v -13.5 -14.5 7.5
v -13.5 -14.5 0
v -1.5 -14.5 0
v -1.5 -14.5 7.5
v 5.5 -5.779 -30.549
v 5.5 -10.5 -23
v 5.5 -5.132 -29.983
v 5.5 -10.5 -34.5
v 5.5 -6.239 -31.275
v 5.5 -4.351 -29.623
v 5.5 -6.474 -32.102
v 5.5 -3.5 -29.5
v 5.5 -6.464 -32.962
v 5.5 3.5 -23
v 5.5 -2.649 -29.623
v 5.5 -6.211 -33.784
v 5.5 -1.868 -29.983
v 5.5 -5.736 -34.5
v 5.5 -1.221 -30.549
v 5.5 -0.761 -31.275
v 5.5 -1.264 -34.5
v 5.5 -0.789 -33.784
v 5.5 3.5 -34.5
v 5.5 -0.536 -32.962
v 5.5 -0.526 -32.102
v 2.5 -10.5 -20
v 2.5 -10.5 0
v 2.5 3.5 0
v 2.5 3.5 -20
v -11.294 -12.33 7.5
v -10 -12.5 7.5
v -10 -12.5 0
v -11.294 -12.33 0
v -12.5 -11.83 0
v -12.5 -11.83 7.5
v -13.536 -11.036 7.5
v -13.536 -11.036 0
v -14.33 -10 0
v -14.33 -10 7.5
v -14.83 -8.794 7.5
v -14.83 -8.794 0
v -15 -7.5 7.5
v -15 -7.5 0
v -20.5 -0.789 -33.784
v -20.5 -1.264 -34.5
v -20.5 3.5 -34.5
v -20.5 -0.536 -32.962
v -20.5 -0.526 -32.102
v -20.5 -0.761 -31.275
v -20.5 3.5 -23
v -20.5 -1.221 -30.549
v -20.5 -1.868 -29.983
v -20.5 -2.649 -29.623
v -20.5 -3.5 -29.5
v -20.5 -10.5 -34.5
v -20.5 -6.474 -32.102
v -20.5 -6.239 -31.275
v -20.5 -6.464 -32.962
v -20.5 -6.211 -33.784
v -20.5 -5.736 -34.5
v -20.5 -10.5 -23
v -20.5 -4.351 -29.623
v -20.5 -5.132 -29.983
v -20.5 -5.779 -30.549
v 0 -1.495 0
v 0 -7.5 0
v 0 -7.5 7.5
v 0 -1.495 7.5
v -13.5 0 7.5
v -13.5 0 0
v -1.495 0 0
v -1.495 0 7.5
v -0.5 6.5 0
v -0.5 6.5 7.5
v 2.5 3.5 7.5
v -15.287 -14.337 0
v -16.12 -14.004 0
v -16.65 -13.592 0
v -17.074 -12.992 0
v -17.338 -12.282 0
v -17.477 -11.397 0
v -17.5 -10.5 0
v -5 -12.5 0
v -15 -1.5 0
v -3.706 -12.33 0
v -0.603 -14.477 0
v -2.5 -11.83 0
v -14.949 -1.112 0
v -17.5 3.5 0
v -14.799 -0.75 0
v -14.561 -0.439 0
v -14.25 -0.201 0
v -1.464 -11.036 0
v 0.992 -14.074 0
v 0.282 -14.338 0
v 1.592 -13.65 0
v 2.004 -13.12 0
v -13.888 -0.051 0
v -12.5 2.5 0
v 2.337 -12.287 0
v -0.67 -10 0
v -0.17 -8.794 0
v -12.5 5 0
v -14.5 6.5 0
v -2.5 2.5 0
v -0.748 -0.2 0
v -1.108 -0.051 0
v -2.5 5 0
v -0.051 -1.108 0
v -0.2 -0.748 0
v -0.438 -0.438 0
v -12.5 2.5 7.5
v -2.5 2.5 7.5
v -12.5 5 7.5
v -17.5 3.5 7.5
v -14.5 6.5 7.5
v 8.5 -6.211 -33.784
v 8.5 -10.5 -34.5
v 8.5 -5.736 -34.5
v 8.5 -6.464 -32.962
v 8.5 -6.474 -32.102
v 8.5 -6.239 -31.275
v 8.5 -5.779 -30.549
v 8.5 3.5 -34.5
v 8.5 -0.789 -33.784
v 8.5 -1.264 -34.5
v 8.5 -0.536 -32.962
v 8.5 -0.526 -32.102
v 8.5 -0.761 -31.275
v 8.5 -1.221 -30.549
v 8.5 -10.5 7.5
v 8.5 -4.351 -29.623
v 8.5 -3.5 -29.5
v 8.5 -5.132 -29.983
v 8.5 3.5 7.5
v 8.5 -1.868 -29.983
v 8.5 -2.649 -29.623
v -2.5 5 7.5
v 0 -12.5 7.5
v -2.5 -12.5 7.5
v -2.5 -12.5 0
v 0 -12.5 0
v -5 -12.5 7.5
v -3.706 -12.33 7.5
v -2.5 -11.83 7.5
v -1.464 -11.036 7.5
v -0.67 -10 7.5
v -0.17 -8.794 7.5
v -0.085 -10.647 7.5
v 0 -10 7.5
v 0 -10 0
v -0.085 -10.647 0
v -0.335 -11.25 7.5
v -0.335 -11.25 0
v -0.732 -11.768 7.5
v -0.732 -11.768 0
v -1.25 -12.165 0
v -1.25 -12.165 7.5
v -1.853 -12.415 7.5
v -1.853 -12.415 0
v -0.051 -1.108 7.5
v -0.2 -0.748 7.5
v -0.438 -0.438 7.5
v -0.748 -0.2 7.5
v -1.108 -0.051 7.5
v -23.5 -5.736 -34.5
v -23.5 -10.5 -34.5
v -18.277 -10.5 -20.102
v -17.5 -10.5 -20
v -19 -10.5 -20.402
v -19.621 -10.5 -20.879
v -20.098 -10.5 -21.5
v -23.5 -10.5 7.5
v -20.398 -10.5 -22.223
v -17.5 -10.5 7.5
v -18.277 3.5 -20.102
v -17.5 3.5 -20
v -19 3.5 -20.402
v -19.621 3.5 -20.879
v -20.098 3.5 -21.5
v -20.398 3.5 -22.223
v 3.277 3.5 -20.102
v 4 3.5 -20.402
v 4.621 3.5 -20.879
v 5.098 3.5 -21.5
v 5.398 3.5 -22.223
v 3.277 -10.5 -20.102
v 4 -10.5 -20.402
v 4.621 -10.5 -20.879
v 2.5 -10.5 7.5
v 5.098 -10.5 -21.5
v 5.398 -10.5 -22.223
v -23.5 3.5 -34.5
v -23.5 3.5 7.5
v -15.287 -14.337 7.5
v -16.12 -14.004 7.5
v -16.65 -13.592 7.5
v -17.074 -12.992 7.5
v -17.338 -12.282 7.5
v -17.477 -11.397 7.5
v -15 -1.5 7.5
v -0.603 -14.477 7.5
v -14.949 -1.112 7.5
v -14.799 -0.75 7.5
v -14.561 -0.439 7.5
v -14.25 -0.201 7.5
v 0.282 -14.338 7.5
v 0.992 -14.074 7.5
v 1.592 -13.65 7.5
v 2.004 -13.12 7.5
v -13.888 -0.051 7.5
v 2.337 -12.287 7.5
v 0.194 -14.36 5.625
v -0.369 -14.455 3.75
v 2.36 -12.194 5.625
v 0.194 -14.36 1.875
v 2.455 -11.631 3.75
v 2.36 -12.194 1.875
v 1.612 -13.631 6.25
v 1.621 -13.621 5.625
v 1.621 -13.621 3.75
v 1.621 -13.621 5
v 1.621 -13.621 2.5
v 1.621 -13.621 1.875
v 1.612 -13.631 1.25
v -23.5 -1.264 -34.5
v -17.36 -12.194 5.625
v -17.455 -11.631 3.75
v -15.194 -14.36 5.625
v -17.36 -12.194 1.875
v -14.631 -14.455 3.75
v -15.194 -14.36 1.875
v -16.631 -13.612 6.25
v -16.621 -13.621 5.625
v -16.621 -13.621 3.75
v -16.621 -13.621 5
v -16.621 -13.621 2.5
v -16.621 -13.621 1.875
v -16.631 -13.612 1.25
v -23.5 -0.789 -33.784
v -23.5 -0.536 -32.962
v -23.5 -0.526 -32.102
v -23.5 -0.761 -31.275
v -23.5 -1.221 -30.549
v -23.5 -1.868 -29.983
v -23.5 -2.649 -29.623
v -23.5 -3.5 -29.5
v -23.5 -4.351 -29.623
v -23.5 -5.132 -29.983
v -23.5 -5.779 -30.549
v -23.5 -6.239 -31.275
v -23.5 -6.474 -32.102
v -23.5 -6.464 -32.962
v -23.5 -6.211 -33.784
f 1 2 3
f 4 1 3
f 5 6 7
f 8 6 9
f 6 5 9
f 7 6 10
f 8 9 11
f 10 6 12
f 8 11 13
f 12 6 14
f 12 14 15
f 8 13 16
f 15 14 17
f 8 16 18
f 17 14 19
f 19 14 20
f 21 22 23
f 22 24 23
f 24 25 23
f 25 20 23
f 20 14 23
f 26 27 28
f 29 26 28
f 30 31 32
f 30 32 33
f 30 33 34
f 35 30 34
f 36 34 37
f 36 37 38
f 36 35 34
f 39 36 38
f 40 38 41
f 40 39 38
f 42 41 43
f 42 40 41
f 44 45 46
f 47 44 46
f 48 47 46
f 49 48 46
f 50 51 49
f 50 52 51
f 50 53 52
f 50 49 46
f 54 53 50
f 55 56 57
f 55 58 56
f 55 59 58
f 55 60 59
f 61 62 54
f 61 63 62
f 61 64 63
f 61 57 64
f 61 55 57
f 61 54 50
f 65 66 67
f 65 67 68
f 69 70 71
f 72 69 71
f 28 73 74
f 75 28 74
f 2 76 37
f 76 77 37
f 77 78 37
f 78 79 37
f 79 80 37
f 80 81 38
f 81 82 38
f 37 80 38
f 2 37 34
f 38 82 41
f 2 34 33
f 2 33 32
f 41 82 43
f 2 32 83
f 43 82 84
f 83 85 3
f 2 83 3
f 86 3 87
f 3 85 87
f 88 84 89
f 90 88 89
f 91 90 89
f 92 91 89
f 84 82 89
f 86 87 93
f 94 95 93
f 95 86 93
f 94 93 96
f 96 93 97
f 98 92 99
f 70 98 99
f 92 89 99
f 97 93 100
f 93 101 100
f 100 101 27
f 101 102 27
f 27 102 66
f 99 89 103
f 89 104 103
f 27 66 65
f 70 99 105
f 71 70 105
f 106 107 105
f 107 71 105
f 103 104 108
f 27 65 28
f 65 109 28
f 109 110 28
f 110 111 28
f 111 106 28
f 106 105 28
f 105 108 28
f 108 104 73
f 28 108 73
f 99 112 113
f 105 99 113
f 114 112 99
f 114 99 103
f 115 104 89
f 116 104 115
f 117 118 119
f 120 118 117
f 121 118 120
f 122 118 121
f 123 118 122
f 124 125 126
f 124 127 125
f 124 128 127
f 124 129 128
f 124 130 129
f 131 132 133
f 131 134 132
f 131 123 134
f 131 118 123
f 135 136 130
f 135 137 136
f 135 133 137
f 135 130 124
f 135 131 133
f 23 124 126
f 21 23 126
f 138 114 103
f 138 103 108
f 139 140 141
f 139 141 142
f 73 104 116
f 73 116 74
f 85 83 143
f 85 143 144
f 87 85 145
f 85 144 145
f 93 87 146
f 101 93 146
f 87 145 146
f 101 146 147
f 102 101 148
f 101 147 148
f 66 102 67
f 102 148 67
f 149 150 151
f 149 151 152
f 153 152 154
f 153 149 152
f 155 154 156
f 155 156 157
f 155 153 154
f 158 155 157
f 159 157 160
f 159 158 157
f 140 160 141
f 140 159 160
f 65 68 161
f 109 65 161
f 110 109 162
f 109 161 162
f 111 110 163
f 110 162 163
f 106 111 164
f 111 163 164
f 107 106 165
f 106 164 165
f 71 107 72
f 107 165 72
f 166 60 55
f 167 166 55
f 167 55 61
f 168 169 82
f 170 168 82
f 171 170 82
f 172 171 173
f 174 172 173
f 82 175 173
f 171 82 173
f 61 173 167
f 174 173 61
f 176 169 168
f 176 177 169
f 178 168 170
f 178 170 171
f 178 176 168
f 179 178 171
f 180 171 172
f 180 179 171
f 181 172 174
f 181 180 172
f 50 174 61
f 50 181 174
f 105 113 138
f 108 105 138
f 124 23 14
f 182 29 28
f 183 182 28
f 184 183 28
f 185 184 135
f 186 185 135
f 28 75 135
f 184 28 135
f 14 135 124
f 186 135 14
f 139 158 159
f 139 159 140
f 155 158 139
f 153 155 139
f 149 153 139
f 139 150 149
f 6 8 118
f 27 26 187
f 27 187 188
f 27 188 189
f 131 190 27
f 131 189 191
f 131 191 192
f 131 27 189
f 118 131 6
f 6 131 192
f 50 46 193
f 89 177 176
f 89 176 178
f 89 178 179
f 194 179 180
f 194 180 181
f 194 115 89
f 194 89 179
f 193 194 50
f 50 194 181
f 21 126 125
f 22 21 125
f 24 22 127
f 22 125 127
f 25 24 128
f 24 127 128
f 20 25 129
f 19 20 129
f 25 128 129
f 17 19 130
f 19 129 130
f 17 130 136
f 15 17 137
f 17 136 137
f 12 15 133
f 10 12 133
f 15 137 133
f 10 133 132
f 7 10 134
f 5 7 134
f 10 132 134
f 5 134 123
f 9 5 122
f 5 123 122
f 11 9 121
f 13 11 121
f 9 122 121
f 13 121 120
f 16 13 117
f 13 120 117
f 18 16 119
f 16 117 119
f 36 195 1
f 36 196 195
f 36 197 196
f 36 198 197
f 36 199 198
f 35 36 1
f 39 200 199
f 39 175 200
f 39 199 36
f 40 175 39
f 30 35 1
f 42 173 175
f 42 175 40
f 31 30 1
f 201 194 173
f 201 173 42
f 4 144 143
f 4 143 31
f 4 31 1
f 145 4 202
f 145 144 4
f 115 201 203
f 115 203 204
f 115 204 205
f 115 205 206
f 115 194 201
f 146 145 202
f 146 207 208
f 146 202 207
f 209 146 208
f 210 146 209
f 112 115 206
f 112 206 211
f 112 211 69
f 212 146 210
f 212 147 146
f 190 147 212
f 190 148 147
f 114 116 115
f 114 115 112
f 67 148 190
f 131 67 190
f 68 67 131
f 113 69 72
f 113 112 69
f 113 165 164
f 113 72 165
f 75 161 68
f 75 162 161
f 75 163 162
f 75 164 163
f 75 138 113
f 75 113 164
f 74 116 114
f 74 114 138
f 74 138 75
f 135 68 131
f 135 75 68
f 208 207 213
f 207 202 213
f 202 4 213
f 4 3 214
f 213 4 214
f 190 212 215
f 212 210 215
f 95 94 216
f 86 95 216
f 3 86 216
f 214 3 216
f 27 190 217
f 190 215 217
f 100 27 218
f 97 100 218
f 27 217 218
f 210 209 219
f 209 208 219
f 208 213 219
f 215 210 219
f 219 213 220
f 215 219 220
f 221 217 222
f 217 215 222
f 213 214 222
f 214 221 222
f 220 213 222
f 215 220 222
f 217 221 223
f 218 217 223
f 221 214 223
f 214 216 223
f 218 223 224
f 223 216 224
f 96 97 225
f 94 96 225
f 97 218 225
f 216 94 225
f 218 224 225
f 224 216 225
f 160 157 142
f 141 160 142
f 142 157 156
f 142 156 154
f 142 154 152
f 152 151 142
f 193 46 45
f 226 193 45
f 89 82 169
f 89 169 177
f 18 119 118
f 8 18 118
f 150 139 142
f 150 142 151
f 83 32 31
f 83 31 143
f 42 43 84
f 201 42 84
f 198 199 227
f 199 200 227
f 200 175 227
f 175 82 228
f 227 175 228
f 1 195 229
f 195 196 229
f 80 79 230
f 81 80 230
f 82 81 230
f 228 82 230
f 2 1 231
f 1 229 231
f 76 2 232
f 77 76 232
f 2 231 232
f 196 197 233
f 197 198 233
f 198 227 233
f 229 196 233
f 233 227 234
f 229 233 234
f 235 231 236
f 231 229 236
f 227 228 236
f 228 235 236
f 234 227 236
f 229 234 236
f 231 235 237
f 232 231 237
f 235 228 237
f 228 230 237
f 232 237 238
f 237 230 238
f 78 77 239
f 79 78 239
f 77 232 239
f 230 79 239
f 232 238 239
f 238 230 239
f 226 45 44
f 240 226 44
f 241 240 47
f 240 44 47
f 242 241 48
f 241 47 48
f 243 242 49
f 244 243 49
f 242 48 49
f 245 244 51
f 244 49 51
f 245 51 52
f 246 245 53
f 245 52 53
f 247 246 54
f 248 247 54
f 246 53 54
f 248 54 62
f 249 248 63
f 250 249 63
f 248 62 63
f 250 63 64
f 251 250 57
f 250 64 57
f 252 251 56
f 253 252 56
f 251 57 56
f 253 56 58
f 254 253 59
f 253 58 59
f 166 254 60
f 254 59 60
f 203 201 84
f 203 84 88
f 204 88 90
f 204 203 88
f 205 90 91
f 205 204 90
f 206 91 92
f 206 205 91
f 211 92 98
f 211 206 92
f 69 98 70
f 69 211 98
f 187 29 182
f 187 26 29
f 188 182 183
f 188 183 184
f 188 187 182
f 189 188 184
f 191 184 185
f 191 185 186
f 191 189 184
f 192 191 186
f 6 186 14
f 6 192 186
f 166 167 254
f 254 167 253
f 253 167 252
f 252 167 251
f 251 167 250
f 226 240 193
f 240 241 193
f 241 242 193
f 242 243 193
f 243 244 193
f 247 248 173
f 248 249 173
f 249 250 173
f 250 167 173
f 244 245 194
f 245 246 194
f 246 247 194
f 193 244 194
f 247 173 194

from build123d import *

# Parameters (mm, degrees)
SKETCH1_W               = 20
SKETCH1_H               = 21
SKETCH1_W_2             = 15
SKETCH1_H_2             = 12.5
BOSS_EXTRUDE1_DEPTH     = 7.5
FILLET1_SIZE            = 4
BOSS_EXTRUDE2_DEPTH     = 7.5
BOSS_EXTRUDE3_DEPTH     = 7.5
BOSS_EXTRUDE4_DEPTH     = 7.5
BOSS_EXTRUDE5_DEPTH     = 7.5
CHAMFER1_SIZE           = 3
SKETCH8_W               = 10
SKETCH8_H               = 2.5
CUT_EXTRUDE1_DEPTH      = 7.5
BOSS_EXTRUDE10_START    = -7.5
SKETCH19_W              = 6
SKETCH19_H              = 14
BOSS_EXTRUDE10_DEPTH    = 52.5
CUT_EXTRUDE5_DEPTH      = 54.863252857
CUT_EXTRUDE5_DEPTH_BACK = 15
FILLET2_R               = 3
CUT_EXTRUDE16_DEPTH     = 3
FILLET3_R               = 3
CUT_EXTRUDE17_DEPTH     = 35


# Some blends are built 0.0001 mm under size
with BuildPart() as part:
    # Sketch1 → Boss-Extrude1 (new body)
    with BuildSketch(Plane.XY):
        with Locations((-7.5, -4)):
            Rectangle(SKETCH1_W, SKETCH1_H)
        with Locations((-7.5, -6.25)):
            Rectangle(SKETCH1_W_2, SKETCH1_H_2, mode=Mode.SUBTRACT)
    extrude(amount=BOSS_EXTRUDE1_DEPTH)

    # Fillet1
    # a fillet whose section is not a circle: 4 mm, written as the material it takes off along each edge
    with BuildSketch(Plane(origin=(-17.5, -14.5, -10), x_dir=(0, 1, 0), z_dir=(0, 0, 1)), Plane(origin=(2.5, -14.5, -10), x_dir=(-1, 0, 0), z_dir=(0, 0, 1))) as fillet1_piece_1:
        with BuildLine():
            add(Edge.make_bspline([(FILLET1_SIZE, 0), (FILLET1_SIZE * 0.831801948466, 0), (FILLET1_SIZE * 0.663603896932, 0), (FILLET1_SIZE * 0.292893218813, -FILLET1_SIZE * 0.0716919198361), (FILLET1_SIZE * 0.0716919198361, -FILLET1_SIZE * 0.292893218813), (0, -FILLET1_SIZE * 0.663603896932), (0, -FILLET1_SIZE * 0.831801948466), (0, -FILLET1_SIZE)], knots=[0, 0, 0, 0, 0, 0, 0.5, 0.5, 1, 1, 1, 1, 1, 1], degree=5))
            Line((0, -FILLET1_SIZE), (0, 0))
            Line((0, 0), (FILLET1_SIZE, 0))
        make_face()
    extrude(amount=27.5, mode=Mode.SUBTRACT)

    # Sketch3 → Boss-Extrude2 (add)
    with BuildSketch(Plane.XY.offset(7.5)):
        with BuildLine():
            Line((-13.5, 0), (-15, 0))
            Line((-15, 0), (-15, -1.5))
            ThreePointArc((-15, -1.5), (-14.560660172, -0.439339828), (-13.5, 0))
        make_face()
    extrude(amount=-BOSS_EXTRUDE2_DEPTH)

    # Sketch4 → Boss-Extrude3 (add)
    with BuildSketch(Plane.XY.offset(7.5)):
        with BuildLine():
            Line((0, 0), (0, -1.495394009))
            ThreePointArc((0, -1.495394009), (-0.437990765, -0.437990765), (-1.495394009, 0))
            Line((-1.495394009, 0), (0, 0))
        make_face()
    extrude(amount=-BOSS_EXTRUDE3_DEPTH)

    # Sketch7 → Boss-Extrude5 (add)
    with BuildSketch(Plane.XY.offset(7.5)):
        with BuildLine():
            Line((-15, -12.5), (-10, -12.5))
            ThreePointArc((-10, -12.5), (-13.535533906, -11.035533906), (-15, -7.5))
            Line((-15, -7.5), (-15, -12.5))
        make_face()
        with BuildLine():
            Line((0, -12.5), (-5, -12.5))
            ThreePointArc((-5, -12.5), (-1.464466094, -11.035533906), (0, -7.5))
            Line((0, -7.5), (0, -12.5))
        make_face()
    extrude(amount=-BOSS_EXTRUDE5_DEPTH)

    # Chamfer1
    chamfer1_edges = [part.edges().sort_by_distance(p)[0] for p in [
        (2.5, 6.5, 3.75),
        (-17.5, 6.5, 3.75),
    ]]
    chamfer(chamfer1_edges, length=CHAMFER1_SIZE)

    # Sketch8 → Cut-Extrude1 (cut)
    with BuildSketch(Plane.XY.offset(7.5)):
        with Locations((-7.5, 3.75)):
            Rectangle(SKETCH8_W, SKETCH8_H)
    extrude(amount=-CUT_EXTRUDE1_DEPTH, mode=Mode.SUBTRACT)

    # Sketch19 → Boss-Extrude10 (add)
    with BuildSketch(Plane(origin=(0, 0, 0), x_dir=(-1, 0, 0), z_dir=(0, 0, -1)).offset(BOSS_EXTRUDE10_START)):
        with Locations((20.5, -3.5)):
            Rectangle(SKETCH19_W, SKETCH19_H)
    boss_extrude10 = extrude(amount=BOSS_EXTRUDE10_DEPTH)

    # Sketch24 → Cut-Extrude5 (cut, two sides: drawn at the far end of the back side and taken through both)
    with BuildSketch(Plane(origin=(0, 3.5, 0), x_dir=(1, 0, 0), z_dir=(0, 1, 0)).offset(-CUT_EXTRUDE5_DEPTH_BACK)):
        Polygon((-20.5, 169.634201094), (-20.5, 45), (-20.5, 20), (-17.5, 20), (107.134201094, 20), (296.782917214, 181.765573603), (169.14871612, 331.399774696), align=None)
    extrude(amount=CUT_EXTRUDE5_DEPTH + CUT_EXTRUDE5_DEPTH_BACK, mode=Mode.SUBTRACT)

    # Fillet2
    fillet2_edges = [part.edges().sort_by_distance(p)[0] for p in [
        (-20.5, -3.5, -20),
    ]]
    fillet(fillet2_edges, radius=FILLET2_R - 0.0001)  # a hair under: the kernel refuses the full size

    # Mirror4: Boss-Extrude10 across plane
    add(boss_extrude10.mirror(Plane.ZY.offset(7.5)))

    # Sketch32 → Cut-Extrude16 (cut)
    with BuildSketch(Plane.ZY.offset(-2.5)):
        Polygon((-20, 3.5), (-20, -10.5), (-44.524944587, -10.5), (-45, -10.5), (-45, 3.5), (-20.308747934, 3.5), align=None)
    extrude(amount=-CUT_EXTRUDE16_DEPTH, mode=Mode.SUBTRACT)

    # Fillet3
    fillet3_edges = [part.edges().sort_by_distance(p)[0] for p in [
        (5.5, -3.5, -20),
    ]]
    fillet(fillet3_edges, radius=FILLET3_R - 0.0001)  # a hair under: the kernel refuses the full size

    # Sketch33 → Cut-Extrude17 (cut)
    with BuildSketch(Plane(origin=(8.5, 0, 0), x_dir=(0, 0, -1), z_dir=(1, 0, 0))):
        with BuildLine():
            ThreePointArc((35.5, -3.5), (35.238612788, -2.275255129), (34.5, -1.263932023))
            Line((34.5, -1.263932023), (34.5, -5.736067977))
            ThreePointArc((34.5, -5.736067977), (35.238612788, -4.724744871), (35.5, -3.5))
        make_face()
        with BuildLine():
            Line((34.5, -5.736067977), (34.5, -1.263932023))
            ThreePointArc((34.5, -1.263932023), (29.5, -3.5), (34.5, -5.736067977))
        make_face()
        with BuildLine():
            Line((45, -10.5), (45, 3.5))
            Line((45, 3.5), (34.5, 3.5))
            Line((34.5, 3.5), (34.5, -1.263932023))
            ThreePointArc((34.5, -1.263932023), (35.238612788, -2.275255129), (35.5, -3.5))
            ThreePointArc((35.5, -3.5), (35.238612788, -4.724744871), (34.5, -5.736067977))
            Line((34.5, -5.736067977), (34.5, -10.5))
            Line((34.5, -10.5), (45, -10.5))
        make_face()
    extrude(amount=-CUT_EXTRUDE17_DEPTH, mode=Mode.SUBTRACT)


with BuildPart() as body_2:
    # Sketch6 → Boss-Extrude4 (new body)
    with BuildSketch(Plane.XY.offset(7.5)):
        with BuildLine():
            Line((0, -12.5), (0, -10))
            ThreePointArc((0, -10), (-0.732233047, -11.767766953), (-2.5, -12.5))
            Line((-2.5, -12.5), (0, -12.5))
        make_face()
    extrude(amount=-BOSS_EXTRUDE4_DEPTH)


solid = Compound([part.part, body_2.part])
